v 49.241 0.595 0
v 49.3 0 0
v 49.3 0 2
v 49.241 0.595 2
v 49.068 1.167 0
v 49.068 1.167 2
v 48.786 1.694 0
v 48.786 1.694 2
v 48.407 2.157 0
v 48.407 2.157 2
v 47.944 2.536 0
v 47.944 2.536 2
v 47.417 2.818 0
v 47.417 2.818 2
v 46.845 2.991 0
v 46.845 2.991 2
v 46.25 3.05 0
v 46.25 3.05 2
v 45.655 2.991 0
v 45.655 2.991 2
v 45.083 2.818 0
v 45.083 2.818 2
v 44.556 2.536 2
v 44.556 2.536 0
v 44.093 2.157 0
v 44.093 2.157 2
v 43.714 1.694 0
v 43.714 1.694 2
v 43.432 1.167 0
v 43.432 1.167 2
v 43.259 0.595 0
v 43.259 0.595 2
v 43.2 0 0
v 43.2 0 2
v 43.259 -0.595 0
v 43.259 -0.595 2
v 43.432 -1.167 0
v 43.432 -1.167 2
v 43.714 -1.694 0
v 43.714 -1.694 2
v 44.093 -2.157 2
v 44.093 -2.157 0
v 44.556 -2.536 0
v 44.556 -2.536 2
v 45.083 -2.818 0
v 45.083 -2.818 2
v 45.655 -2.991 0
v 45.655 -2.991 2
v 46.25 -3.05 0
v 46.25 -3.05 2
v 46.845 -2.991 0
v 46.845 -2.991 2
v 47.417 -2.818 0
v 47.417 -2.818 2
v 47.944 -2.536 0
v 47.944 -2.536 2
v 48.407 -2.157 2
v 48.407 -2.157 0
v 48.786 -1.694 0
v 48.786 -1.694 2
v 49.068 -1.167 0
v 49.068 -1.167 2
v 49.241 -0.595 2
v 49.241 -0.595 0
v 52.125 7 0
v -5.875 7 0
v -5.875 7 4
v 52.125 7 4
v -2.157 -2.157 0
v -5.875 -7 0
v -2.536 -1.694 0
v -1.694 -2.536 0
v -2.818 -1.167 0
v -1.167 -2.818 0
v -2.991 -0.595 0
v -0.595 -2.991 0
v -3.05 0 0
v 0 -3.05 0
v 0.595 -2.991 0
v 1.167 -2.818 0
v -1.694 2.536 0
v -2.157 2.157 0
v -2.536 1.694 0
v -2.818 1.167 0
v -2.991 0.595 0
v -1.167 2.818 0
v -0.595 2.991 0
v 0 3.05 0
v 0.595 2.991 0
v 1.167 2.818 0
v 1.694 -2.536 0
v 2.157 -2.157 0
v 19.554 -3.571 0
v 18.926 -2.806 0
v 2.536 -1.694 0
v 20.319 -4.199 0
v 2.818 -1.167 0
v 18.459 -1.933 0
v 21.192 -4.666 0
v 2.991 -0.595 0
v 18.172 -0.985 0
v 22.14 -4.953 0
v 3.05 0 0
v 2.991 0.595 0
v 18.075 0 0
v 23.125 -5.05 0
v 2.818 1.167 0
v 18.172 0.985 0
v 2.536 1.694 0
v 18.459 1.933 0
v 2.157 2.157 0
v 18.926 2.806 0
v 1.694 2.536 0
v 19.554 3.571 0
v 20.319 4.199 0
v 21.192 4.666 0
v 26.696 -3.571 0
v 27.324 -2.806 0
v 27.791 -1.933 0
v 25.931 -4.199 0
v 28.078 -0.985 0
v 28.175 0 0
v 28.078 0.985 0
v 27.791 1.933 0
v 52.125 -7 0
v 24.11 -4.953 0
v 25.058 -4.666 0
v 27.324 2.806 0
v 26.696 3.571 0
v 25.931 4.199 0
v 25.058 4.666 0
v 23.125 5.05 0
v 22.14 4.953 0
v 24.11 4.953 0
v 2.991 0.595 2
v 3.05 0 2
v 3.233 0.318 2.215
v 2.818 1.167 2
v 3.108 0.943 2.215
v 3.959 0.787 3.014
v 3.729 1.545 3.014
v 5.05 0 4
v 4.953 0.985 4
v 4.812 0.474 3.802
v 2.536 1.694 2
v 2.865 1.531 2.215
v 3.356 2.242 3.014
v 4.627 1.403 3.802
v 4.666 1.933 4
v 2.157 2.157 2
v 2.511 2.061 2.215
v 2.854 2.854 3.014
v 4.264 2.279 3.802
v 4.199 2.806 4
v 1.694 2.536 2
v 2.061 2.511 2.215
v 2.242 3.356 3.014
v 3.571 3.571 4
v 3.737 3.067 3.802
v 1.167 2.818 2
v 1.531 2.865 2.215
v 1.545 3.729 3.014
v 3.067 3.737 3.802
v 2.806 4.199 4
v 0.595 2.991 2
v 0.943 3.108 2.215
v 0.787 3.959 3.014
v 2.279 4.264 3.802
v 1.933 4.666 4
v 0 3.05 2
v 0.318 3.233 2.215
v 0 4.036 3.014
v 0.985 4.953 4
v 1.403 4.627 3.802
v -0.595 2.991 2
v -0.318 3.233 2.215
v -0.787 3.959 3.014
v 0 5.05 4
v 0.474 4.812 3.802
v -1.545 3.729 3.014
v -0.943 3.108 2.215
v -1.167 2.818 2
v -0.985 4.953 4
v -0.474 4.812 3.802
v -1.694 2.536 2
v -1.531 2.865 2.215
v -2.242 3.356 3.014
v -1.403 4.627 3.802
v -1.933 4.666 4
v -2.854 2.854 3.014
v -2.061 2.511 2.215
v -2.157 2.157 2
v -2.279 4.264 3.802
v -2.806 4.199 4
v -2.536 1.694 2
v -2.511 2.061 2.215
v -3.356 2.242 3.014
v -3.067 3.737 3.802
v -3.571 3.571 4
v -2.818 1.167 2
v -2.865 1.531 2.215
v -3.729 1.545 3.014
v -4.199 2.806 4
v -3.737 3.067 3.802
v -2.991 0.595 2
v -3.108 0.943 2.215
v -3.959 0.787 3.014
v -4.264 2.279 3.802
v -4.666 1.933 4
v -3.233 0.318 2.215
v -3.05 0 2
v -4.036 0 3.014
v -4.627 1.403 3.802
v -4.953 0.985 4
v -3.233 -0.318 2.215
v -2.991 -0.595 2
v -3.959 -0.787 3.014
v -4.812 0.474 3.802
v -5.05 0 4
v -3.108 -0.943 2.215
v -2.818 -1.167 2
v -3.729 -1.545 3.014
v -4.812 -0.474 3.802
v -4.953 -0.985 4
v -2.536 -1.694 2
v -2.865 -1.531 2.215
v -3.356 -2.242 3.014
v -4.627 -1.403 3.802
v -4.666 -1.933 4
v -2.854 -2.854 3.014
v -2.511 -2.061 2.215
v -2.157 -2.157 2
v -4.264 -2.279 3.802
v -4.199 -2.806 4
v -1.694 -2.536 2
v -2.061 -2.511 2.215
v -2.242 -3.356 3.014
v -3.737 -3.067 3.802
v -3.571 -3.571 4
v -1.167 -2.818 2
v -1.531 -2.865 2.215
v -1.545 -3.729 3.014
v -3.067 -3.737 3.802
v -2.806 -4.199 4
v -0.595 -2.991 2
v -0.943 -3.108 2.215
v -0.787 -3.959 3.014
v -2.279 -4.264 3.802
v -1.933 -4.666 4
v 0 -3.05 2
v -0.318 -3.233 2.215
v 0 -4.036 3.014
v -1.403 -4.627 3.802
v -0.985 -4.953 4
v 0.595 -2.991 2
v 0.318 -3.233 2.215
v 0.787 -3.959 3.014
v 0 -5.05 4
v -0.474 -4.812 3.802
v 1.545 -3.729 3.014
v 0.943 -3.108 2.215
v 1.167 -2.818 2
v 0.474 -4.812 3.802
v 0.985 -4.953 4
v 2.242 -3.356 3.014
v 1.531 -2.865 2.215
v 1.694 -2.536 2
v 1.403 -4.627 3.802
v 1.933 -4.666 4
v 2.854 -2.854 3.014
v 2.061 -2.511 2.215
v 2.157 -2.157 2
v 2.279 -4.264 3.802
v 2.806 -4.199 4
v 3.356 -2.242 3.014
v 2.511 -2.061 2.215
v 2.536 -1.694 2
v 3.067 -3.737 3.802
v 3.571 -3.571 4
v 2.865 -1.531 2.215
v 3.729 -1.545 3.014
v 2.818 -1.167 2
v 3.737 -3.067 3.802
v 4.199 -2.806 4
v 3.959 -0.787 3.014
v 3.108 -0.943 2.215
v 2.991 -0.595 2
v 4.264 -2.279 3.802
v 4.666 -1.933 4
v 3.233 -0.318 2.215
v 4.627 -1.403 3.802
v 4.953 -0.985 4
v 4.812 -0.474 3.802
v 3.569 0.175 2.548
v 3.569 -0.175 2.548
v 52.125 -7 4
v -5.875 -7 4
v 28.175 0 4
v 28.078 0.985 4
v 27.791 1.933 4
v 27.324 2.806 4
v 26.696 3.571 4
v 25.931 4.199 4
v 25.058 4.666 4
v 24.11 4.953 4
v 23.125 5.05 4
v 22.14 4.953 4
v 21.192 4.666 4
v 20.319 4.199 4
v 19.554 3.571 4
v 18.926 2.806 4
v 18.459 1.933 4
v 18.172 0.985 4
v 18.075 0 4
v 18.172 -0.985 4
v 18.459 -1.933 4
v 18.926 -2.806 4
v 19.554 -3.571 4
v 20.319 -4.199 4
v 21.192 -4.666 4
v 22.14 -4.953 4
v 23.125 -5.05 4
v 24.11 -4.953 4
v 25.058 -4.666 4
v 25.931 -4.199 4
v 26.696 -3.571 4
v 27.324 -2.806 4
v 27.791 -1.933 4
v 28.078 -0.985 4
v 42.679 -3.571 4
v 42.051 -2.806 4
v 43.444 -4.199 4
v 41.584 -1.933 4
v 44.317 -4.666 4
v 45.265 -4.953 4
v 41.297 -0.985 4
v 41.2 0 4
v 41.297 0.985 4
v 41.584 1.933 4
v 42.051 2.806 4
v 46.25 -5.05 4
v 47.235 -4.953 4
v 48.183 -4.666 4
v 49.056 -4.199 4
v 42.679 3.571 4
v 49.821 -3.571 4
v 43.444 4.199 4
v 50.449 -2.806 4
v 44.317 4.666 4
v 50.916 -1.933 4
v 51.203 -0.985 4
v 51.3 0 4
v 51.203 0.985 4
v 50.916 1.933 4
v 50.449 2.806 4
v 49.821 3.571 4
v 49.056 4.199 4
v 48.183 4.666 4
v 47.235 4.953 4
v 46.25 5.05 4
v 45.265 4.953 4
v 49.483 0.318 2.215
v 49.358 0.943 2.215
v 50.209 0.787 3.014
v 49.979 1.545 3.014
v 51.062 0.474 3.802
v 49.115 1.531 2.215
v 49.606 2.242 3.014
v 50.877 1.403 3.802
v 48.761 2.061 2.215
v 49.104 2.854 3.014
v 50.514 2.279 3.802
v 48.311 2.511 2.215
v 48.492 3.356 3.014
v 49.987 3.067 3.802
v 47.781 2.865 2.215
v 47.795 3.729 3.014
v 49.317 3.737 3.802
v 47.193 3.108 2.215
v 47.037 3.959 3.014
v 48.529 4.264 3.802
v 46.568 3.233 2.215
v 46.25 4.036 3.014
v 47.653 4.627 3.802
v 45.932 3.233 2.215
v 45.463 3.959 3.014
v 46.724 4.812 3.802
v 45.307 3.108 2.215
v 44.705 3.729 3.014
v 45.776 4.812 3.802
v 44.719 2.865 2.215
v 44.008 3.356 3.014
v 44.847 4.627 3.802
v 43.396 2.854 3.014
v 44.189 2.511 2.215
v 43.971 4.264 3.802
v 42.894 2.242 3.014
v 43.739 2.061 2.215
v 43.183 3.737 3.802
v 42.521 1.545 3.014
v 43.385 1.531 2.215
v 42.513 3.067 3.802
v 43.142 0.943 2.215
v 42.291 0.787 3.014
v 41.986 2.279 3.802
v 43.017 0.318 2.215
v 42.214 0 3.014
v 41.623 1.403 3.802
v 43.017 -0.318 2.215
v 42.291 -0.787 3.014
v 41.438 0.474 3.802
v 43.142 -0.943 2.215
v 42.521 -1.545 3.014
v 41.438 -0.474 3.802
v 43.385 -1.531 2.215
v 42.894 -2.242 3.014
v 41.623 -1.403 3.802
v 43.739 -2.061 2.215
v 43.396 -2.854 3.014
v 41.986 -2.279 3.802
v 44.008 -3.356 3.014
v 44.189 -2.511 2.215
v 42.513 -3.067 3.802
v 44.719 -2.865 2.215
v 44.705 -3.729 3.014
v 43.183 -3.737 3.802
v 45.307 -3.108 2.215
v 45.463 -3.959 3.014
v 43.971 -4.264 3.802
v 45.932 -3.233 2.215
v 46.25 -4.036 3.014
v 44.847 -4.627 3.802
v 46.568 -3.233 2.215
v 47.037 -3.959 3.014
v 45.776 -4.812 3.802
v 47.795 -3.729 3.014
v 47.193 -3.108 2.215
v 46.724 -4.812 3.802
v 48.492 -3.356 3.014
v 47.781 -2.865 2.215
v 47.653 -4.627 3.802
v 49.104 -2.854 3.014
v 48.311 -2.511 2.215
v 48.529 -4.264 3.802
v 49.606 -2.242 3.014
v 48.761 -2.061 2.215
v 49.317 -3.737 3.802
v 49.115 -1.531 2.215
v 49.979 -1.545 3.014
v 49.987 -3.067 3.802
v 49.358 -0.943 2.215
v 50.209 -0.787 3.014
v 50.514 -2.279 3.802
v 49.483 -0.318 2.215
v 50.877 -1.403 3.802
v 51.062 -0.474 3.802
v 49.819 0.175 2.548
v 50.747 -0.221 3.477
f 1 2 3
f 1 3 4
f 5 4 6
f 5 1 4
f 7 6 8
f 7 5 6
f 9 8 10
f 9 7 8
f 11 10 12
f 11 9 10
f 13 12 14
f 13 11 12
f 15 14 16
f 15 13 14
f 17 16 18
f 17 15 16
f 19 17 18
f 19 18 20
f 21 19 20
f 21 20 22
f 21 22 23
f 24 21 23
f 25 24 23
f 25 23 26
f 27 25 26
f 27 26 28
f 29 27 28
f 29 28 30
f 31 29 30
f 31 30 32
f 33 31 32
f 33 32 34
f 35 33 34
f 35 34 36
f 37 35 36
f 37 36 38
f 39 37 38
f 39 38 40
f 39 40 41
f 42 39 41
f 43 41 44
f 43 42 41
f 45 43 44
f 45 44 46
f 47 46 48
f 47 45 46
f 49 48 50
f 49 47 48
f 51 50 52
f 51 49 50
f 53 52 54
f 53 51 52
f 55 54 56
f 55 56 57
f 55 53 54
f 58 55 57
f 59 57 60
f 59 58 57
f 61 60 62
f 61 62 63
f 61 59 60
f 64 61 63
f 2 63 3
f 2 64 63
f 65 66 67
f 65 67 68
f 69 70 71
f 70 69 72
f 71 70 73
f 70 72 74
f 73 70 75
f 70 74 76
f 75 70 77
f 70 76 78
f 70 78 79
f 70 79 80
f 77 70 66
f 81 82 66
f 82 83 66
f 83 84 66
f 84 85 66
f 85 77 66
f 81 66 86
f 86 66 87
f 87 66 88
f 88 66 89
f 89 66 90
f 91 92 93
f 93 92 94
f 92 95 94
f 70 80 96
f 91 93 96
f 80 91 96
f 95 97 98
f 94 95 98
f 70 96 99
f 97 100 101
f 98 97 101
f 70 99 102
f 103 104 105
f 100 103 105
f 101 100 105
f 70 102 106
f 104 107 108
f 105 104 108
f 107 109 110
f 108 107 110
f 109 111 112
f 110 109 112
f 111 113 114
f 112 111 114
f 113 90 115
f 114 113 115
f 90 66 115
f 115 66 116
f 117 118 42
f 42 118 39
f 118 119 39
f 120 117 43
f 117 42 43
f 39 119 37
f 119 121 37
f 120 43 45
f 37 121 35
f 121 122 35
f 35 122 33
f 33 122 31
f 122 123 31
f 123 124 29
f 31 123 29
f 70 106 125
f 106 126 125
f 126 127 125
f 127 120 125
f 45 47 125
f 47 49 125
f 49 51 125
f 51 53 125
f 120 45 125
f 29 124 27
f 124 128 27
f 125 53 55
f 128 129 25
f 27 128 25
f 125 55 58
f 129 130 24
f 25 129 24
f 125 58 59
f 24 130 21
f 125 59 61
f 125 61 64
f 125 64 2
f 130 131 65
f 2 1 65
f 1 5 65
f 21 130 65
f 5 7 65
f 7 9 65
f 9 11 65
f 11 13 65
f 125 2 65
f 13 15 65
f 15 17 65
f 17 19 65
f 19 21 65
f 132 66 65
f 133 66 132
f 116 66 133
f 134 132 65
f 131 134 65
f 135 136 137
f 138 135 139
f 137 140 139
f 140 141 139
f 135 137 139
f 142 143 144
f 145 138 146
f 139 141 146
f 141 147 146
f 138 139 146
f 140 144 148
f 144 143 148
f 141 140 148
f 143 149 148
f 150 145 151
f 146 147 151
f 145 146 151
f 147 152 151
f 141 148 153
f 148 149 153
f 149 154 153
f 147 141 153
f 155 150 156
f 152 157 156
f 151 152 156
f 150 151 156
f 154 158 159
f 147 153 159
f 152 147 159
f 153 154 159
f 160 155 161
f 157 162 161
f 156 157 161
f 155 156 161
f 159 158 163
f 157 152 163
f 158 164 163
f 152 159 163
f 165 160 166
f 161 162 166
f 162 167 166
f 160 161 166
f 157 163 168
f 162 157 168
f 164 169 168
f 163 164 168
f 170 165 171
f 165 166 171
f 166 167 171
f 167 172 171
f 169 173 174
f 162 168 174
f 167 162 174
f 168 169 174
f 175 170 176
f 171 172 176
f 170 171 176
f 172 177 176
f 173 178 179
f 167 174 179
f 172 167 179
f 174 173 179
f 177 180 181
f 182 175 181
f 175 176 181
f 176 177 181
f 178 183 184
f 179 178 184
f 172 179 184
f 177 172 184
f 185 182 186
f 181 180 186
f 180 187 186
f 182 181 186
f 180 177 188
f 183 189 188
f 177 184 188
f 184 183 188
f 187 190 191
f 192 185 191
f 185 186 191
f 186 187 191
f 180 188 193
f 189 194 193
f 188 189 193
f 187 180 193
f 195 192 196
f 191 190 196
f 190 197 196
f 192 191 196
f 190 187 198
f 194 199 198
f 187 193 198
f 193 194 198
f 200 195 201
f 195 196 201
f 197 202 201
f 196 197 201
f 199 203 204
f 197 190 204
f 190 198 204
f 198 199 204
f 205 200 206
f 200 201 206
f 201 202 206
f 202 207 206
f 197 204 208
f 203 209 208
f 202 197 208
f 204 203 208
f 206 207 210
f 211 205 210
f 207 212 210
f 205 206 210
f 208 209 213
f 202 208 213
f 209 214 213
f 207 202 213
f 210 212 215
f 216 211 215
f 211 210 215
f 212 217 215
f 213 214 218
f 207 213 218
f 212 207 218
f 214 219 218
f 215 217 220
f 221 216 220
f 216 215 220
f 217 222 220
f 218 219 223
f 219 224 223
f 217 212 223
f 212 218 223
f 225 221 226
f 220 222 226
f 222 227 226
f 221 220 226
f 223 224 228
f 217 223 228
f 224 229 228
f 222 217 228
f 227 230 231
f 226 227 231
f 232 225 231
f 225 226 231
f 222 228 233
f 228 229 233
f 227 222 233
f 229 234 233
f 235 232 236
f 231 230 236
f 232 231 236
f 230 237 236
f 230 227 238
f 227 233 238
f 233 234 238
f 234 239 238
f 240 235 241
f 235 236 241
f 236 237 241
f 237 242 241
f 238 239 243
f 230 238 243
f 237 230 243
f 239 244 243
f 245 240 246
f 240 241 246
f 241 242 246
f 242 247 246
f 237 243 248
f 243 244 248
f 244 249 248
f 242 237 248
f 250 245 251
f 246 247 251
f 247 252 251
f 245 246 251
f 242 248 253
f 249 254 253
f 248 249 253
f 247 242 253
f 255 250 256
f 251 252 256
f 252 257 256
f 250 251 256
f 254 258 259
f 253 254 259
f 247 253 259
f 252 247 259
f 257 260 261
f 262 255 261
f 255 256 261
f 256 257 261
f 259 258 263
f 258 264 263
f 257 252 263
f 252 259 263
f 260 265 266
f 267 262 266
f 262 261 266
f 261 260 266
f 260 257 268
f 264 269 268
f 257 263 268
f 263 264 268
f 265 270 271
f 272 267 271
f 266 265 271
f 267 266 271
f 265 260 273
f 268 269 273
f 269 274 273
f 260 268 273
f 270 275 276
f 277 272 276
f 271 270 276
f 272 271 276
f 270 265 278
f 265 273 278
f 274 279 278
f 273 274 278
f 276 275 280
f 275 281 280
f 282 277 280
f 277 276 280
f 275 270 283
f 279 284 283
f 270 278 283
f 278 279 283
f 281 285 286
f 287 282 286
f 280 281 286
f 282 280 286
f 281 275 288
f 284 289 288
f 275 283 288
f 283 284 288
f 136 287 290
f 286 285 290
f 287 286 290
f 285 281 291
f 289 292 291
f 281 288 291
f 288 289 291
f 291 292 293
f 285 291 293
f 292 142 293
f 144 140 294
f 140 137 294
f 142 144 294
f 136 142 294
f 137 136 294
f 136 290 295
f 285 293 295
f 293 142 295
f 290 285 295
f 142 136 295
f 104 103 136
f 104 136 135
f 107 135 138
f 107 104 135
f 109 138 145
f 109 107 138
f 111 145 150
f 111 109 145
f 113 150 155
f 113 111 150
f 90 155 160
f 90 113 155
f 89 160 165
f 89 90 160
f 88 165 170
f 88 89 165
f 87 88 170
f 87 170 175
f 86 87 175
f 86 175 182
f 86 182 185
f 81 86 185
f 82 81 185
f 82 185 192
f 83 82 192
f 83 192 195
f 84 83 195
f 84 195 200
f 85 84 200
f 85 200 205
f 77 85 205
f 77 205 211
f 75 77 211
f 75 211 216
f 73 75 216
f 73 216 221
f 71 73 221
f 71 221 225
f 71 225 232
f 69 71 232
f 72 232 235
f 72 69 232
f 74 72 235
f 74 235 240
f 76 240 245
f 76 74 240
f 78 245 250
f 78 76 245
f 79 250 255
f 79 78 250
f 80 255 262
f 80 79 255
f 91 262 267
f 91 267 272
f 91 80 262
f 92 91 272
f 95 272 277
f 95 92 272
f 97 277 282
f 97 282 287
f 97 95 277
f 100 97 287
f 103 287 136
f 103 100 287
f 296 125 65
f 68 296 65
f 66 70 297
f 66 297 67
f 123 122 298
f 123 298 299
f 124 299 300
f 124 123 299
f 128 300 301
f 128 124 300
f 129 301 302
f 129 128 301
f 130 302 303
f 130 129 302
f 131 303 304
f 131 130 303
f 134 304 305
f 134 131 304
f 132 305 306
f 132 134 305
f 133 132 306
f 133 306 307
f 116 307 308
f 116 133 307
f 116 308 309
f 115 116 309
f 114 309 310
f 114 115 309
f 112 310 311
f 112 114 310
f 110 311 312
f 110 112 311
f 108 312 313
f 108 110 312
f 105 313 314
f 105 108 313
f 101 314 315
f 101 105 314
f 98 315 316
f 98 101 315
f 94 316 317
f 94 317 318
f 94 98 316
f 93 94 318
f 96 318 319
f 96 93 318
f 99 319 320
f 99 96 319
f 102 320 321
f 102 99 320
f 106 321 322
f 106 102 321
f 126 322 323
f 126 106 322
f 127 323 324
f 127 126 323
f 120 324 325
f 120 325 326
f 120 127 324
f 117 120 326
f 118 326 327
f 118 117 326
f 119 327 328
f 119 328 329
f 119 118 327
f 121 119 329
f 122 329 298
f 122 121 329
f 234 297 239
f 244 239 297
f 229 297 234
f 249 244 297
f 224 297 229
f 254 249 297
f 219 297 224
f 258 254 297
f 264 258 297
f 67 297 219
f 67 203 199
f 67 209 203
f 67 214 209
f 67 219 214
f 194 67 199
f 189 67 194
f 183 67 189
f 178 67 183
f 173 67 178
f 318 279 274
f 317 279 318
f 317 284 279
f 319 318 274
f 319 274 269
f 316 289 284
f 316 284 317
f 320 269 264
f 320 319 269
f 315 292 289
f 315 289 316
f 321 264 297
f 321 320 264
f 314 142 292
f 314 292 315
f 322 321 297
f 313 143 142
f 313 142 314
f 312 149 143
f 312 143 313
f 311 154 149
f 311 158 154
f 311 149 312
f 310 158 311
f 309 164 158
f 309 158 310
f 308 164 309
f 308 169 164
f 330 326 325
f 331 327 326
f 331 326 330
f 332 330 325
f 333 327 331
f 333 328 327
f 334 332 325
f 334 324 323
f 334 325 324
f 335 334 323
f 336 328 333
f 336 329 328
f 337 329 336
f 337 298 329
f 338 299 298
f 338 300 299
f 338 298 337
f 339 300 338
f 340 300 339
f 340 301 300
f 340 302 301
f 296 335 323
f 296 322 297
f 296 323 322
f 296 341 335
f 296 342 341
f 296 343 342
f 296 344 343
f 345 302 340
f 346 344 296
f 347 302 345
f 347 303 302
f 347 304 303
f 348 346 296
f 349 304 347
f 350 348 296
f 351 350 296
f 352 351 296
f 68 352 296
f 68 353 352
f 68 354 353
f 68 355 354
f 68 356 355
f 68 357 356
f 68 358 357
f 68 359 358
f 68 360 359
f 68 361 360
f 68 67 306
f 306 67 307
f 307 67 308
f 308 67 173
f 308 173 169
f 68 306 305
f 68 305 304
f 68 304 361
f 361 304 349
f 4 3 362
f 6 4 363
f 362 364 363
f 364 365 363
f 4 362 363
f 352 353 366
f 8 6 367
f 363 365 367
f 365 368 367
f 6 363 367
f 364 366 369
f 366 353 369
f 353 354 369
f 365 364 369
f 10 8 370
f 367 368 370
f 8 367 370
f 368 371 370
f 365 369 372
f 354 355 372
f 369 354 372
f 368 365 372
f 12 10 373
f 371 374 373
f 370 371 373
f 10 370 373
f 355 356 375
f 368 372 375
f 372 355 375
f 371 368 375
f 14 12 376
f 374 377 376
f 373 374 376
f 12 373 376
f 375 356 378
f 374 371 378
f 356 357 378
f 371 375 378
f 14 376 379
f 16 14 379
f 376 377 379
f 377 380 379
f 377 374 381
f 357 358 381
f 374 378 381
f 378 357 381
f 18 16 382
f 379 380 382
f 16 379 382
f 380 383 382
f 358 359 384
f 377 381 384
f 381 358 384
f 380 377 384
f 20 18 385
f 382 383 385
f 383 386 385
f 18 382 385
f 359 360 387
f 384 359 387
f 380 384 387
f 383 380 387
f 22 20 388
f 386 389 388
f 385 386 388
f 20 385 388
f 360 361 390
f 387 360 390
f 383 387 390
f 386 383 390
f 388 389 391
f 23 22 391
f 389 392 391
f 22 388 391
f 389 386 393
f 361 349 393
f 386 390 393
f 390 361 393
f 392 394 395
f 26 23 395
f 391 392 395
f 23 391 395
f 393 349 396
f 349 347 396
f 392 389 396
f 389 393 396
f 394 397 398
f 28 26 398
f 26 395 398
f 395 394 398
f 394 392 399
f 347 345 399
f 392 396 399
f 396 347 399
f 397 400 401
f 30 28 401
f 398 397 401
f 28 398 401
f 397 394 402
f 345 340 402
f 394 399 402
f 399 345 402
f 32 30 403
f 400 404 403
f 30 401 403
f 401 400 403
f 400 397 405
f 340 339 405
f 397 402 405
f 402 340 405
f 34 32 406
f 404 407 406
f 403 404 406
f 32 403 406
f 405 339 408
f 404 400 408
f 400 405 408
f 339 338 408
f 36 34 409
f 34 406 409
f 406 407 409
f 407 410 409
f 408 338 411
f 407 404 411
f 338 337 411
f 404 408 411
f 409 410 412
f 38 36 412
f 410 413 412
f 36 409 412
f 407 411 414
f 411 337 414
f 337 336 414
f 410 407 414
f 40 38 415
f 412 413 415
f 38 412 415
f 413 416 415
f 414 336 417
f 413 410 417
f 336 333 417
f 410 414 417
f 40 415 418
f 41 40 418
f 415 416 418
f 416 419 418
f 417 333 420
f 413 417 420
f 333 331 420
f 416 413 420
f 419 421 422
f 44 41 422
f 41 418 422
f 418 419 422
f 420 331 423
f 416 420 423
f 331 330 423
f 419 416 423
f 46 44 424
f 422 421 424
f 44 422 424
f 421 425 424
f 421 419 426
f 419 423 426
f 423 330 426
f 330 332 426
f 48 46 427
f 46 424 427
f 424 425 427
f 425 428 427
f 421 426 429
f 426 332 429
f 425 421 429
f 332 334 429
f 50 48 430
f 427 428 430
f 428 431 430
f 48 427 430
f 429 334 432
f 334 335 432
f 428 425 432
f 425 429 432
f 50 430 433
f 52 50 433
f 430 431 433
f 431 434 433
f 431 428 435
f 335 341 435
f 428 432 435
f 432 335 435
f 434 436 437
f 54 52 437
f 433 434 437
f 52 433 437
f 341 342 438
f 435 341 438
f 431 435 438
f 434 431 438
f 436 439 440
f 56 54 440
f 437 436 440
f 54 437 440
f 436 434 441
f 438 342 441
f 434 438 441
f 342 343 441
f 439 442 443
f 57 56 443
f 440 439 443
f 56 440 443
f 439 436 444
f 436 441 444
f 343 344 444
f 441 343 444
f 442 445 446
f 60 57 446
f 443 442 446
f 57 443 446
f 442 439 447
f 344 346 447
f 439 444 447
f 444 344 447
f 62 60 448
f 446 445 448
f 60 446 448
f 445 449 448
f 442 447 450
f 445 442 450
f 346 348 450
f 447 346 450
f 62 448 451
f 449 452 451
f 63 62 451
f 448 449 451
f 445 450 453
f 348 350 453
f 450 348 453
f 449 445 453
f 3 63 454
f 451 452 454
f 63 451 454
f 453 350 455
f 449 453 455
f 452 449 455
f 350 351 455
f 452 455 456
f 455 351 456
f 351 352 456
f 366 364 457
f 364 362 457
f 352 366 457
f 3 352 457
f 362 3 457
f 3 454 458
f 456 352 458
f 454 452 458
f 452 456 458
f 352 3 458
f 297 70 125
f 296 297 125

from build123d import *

# Parameters (mm, degrees)
SKETCH_1_W      = 58
SKETCH_1_H      = 14
SKETCH_1_R      = 3.05
SKETCH_1_R_2    = 5.05
EXTRUDE_1_DEPTH = 4
FILLET_1_SIZE   = 2


with BuildPart() as part:
    # 草图1 → 凸台-拉伸1 (new body)
    with BuildSketch(Plane.XY):
        with Locations((23.125, 0)):
            Rectangle(SKETCH_1_W, SKETCH_1_H)
        Circle(SKETCH_1_R, mode=Mode.SUBTRACT)
        with Locations((46.25, 0)):
            Circle(SKETCH_1_R, mode=Mode.SUBTRACT)
        with Locations((23.125, 0)):
            Circle(SKETCH_1_R_2, mode=Mode.SUBTRACT)
    extrude(amount=EXTRUDE_1_DEPTH)

    # 圆角1
    # a fillet whose section is not a circle: 2 mm, written as the material it takes off along each edge
    with BuildSketch(Plane(origin=(0, 0, 4), x_dir=(1, 0, 0), z_dir=(0, -1, 0))) as fillet_1_piece_1:
        with BuildLine():
            Bezier((3.05, -FILLET_1_SIZE), (3.05, 0), (3.05 + FILLET_1_SIZE, 0), weights=[1, 0.014142136, 1])
            Line((3.05 + FILLET_1_SIZE, 0), (3.05, 0))
            Line((3.05, 0), (3.05, -FILLET_1_SIZE))
        make_face()
    revolve(axis=Axis((0, 0, 4), (0, 0, 1)), mode=Mode.SUBTRACT)
    with BuildSketch(Plane(origin=(46.25, 0, 4), x_dir=(1, 0, 0), z_dir=(0, -1, 0))) as fillet_1_piece_2:
        with BuildLine():
            Bezier((3.05, -FILLET_1_SIZE), (3.05, 0), (3.05 + FILLET_1_SIZE, 0), weights=[1, 0.014142136, 1])
            Line((3.05 + FILLET_1_SIZE, 0), (3.05, 0))
            Line((3.05, 0), (3.05, -FILLET_1_SIZE))
        make_face()
    revolve(axis=Axis((46.25, 0, 4), (0, 0, 1)), mode=Mode.SUBTRACT)


solid = part.part
